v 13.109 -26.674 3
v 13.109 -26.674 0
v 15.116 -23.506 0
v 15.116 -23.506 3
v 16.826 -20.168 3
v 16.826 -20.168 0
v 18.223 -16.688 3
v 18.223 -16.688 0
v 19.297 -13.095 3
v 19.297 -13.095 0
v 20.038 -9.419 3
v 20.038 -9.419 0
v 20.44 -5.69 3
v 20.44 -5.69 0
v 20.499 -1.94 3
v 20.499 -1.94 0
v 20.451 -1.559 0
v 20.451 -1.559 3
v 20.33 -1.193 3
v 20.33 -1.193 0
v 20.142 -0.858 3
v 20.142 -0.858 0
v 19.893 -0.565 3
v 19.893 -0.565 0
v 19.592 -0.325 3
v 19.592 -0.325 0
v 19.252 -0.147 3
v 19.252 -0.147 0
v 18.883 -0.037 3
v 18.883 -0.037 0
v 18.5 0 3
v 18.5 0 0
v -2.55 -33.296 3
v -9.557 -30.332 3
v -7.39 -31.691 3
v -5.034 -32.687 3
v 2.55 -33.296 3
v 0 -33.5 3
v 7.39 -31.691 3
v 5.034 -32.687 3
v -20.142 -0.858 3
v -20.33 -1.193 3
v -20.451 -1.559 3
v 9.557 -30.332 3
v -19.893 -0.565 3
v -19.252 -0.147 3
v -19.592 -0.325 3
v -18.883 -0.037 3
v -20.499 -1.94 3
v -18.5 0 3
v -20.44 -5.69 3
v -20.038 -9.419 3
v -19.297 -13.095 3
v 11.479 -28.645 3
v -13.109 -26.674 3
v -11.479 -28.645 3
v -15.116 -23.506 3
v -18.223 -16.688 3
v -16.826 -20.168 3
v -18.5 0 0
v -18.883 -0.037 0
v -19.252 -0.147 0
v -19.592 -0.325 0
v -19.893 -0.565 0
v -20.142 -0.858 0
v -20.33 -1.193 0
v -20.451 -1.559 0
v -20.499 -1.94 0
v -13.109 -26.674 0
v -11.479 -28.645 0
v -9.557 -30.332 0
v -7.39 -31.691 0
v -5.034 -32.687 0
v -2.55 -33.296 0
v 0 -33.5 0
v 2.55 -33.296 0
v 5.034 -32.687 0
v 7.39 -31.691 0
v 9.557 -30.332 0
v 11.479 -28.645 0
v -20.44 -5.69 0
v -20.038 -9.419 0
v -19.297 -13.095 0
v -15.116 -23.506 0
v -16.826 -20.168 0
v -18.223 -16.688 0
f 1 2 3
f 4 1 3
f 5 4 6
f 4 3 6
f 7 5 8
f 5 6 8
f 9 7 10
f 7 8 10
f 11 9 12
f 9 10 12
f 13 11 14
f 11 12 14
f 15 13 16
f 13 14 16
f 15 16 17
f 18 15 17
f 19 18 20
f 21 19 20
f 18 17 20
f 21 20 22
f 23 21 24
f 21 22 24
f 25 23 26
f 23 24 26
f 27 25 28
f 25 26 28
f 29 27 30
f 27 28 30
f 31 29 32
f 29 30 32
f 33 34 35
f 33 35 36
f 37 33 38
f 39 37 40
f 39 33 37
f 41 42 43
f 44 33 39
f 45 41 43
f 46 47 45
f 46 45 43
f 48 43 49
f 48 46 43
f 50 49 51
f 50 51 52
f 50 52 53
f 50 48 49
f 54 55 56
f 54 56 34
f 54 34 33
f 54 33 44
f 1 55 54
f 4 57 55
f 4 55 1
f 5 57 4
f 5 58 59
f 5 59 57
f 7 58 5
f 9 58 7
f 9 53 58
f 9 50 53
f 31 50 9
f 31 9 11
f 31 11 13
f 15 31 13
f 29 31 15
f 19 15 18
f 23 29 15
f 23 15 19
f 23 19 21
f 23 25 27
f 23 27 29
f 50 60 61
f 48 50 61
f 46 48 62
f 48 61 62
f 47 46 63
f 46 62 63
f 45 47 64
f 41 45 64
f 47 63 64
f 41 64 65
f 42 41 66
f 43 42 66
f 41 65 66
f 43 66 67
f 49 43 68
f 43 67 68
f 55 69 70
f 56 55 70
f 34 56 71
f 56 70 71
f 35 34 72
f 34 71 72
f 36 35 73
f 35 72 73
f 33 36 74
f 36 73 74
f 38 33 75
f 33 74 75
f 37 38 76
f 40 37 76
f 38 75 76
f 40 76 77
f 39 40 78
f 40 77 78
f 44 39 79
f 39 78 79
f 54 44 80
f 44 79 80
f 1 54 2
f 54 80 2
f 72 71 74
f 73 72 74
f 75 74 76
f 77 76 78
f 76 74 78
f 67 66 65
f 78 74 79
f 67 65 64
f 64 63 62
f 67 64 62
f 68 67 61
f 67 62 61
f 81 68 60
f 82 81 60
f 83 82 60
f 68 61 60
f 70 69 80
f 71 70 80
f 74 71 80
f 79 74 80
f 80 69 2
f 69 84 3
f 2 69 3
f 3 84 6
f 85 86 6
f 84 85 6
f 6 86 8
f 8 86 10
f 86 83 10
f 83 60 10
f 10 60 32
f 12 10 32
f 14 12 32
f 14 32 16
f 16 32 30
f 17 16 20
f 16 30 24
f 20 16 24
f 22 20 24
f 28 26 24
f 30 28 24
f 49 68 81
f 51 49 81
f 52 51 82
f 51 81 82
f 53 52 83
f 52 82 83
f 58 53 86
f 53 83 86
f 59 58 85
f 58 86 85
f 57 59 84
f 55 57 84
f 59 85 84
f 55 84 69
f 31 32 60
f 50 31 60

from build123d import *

# Parameters (mm, degrees)
F1_DEPTH = 3


with BuildPart() as f1:
    # F0 (on Top) → F1 (new body)
    with BuildSketch(Plane.XY):
        with BuildLine():
            Line((0, 0), (-18.5, 0))
            ThreePointArc((-18.5, 0), (-19.892913, -0.564802), (-20.499106, -1.940207))
            ThreePointArc((-20.499106, -1.940207), (-18.801318, -14.903789), (-13.108843, -26.67378))
            ThreePointArc((-13.108843, -26.67378), (0, -33.5), (13.108843, -26.67378))
            ThreePointArc((13.108843, -26.67378), (18.801318, -14.903789), (20.499106, -1.940207))
            ThreePointArc((20.499106, -1.940207), (19.892913, -0.564802), (18.5, 0))
            Line((18.5, 0), (0, 0))
        make_face()
    extrude(amount=F1_DEPTH)


solid = f1.part
